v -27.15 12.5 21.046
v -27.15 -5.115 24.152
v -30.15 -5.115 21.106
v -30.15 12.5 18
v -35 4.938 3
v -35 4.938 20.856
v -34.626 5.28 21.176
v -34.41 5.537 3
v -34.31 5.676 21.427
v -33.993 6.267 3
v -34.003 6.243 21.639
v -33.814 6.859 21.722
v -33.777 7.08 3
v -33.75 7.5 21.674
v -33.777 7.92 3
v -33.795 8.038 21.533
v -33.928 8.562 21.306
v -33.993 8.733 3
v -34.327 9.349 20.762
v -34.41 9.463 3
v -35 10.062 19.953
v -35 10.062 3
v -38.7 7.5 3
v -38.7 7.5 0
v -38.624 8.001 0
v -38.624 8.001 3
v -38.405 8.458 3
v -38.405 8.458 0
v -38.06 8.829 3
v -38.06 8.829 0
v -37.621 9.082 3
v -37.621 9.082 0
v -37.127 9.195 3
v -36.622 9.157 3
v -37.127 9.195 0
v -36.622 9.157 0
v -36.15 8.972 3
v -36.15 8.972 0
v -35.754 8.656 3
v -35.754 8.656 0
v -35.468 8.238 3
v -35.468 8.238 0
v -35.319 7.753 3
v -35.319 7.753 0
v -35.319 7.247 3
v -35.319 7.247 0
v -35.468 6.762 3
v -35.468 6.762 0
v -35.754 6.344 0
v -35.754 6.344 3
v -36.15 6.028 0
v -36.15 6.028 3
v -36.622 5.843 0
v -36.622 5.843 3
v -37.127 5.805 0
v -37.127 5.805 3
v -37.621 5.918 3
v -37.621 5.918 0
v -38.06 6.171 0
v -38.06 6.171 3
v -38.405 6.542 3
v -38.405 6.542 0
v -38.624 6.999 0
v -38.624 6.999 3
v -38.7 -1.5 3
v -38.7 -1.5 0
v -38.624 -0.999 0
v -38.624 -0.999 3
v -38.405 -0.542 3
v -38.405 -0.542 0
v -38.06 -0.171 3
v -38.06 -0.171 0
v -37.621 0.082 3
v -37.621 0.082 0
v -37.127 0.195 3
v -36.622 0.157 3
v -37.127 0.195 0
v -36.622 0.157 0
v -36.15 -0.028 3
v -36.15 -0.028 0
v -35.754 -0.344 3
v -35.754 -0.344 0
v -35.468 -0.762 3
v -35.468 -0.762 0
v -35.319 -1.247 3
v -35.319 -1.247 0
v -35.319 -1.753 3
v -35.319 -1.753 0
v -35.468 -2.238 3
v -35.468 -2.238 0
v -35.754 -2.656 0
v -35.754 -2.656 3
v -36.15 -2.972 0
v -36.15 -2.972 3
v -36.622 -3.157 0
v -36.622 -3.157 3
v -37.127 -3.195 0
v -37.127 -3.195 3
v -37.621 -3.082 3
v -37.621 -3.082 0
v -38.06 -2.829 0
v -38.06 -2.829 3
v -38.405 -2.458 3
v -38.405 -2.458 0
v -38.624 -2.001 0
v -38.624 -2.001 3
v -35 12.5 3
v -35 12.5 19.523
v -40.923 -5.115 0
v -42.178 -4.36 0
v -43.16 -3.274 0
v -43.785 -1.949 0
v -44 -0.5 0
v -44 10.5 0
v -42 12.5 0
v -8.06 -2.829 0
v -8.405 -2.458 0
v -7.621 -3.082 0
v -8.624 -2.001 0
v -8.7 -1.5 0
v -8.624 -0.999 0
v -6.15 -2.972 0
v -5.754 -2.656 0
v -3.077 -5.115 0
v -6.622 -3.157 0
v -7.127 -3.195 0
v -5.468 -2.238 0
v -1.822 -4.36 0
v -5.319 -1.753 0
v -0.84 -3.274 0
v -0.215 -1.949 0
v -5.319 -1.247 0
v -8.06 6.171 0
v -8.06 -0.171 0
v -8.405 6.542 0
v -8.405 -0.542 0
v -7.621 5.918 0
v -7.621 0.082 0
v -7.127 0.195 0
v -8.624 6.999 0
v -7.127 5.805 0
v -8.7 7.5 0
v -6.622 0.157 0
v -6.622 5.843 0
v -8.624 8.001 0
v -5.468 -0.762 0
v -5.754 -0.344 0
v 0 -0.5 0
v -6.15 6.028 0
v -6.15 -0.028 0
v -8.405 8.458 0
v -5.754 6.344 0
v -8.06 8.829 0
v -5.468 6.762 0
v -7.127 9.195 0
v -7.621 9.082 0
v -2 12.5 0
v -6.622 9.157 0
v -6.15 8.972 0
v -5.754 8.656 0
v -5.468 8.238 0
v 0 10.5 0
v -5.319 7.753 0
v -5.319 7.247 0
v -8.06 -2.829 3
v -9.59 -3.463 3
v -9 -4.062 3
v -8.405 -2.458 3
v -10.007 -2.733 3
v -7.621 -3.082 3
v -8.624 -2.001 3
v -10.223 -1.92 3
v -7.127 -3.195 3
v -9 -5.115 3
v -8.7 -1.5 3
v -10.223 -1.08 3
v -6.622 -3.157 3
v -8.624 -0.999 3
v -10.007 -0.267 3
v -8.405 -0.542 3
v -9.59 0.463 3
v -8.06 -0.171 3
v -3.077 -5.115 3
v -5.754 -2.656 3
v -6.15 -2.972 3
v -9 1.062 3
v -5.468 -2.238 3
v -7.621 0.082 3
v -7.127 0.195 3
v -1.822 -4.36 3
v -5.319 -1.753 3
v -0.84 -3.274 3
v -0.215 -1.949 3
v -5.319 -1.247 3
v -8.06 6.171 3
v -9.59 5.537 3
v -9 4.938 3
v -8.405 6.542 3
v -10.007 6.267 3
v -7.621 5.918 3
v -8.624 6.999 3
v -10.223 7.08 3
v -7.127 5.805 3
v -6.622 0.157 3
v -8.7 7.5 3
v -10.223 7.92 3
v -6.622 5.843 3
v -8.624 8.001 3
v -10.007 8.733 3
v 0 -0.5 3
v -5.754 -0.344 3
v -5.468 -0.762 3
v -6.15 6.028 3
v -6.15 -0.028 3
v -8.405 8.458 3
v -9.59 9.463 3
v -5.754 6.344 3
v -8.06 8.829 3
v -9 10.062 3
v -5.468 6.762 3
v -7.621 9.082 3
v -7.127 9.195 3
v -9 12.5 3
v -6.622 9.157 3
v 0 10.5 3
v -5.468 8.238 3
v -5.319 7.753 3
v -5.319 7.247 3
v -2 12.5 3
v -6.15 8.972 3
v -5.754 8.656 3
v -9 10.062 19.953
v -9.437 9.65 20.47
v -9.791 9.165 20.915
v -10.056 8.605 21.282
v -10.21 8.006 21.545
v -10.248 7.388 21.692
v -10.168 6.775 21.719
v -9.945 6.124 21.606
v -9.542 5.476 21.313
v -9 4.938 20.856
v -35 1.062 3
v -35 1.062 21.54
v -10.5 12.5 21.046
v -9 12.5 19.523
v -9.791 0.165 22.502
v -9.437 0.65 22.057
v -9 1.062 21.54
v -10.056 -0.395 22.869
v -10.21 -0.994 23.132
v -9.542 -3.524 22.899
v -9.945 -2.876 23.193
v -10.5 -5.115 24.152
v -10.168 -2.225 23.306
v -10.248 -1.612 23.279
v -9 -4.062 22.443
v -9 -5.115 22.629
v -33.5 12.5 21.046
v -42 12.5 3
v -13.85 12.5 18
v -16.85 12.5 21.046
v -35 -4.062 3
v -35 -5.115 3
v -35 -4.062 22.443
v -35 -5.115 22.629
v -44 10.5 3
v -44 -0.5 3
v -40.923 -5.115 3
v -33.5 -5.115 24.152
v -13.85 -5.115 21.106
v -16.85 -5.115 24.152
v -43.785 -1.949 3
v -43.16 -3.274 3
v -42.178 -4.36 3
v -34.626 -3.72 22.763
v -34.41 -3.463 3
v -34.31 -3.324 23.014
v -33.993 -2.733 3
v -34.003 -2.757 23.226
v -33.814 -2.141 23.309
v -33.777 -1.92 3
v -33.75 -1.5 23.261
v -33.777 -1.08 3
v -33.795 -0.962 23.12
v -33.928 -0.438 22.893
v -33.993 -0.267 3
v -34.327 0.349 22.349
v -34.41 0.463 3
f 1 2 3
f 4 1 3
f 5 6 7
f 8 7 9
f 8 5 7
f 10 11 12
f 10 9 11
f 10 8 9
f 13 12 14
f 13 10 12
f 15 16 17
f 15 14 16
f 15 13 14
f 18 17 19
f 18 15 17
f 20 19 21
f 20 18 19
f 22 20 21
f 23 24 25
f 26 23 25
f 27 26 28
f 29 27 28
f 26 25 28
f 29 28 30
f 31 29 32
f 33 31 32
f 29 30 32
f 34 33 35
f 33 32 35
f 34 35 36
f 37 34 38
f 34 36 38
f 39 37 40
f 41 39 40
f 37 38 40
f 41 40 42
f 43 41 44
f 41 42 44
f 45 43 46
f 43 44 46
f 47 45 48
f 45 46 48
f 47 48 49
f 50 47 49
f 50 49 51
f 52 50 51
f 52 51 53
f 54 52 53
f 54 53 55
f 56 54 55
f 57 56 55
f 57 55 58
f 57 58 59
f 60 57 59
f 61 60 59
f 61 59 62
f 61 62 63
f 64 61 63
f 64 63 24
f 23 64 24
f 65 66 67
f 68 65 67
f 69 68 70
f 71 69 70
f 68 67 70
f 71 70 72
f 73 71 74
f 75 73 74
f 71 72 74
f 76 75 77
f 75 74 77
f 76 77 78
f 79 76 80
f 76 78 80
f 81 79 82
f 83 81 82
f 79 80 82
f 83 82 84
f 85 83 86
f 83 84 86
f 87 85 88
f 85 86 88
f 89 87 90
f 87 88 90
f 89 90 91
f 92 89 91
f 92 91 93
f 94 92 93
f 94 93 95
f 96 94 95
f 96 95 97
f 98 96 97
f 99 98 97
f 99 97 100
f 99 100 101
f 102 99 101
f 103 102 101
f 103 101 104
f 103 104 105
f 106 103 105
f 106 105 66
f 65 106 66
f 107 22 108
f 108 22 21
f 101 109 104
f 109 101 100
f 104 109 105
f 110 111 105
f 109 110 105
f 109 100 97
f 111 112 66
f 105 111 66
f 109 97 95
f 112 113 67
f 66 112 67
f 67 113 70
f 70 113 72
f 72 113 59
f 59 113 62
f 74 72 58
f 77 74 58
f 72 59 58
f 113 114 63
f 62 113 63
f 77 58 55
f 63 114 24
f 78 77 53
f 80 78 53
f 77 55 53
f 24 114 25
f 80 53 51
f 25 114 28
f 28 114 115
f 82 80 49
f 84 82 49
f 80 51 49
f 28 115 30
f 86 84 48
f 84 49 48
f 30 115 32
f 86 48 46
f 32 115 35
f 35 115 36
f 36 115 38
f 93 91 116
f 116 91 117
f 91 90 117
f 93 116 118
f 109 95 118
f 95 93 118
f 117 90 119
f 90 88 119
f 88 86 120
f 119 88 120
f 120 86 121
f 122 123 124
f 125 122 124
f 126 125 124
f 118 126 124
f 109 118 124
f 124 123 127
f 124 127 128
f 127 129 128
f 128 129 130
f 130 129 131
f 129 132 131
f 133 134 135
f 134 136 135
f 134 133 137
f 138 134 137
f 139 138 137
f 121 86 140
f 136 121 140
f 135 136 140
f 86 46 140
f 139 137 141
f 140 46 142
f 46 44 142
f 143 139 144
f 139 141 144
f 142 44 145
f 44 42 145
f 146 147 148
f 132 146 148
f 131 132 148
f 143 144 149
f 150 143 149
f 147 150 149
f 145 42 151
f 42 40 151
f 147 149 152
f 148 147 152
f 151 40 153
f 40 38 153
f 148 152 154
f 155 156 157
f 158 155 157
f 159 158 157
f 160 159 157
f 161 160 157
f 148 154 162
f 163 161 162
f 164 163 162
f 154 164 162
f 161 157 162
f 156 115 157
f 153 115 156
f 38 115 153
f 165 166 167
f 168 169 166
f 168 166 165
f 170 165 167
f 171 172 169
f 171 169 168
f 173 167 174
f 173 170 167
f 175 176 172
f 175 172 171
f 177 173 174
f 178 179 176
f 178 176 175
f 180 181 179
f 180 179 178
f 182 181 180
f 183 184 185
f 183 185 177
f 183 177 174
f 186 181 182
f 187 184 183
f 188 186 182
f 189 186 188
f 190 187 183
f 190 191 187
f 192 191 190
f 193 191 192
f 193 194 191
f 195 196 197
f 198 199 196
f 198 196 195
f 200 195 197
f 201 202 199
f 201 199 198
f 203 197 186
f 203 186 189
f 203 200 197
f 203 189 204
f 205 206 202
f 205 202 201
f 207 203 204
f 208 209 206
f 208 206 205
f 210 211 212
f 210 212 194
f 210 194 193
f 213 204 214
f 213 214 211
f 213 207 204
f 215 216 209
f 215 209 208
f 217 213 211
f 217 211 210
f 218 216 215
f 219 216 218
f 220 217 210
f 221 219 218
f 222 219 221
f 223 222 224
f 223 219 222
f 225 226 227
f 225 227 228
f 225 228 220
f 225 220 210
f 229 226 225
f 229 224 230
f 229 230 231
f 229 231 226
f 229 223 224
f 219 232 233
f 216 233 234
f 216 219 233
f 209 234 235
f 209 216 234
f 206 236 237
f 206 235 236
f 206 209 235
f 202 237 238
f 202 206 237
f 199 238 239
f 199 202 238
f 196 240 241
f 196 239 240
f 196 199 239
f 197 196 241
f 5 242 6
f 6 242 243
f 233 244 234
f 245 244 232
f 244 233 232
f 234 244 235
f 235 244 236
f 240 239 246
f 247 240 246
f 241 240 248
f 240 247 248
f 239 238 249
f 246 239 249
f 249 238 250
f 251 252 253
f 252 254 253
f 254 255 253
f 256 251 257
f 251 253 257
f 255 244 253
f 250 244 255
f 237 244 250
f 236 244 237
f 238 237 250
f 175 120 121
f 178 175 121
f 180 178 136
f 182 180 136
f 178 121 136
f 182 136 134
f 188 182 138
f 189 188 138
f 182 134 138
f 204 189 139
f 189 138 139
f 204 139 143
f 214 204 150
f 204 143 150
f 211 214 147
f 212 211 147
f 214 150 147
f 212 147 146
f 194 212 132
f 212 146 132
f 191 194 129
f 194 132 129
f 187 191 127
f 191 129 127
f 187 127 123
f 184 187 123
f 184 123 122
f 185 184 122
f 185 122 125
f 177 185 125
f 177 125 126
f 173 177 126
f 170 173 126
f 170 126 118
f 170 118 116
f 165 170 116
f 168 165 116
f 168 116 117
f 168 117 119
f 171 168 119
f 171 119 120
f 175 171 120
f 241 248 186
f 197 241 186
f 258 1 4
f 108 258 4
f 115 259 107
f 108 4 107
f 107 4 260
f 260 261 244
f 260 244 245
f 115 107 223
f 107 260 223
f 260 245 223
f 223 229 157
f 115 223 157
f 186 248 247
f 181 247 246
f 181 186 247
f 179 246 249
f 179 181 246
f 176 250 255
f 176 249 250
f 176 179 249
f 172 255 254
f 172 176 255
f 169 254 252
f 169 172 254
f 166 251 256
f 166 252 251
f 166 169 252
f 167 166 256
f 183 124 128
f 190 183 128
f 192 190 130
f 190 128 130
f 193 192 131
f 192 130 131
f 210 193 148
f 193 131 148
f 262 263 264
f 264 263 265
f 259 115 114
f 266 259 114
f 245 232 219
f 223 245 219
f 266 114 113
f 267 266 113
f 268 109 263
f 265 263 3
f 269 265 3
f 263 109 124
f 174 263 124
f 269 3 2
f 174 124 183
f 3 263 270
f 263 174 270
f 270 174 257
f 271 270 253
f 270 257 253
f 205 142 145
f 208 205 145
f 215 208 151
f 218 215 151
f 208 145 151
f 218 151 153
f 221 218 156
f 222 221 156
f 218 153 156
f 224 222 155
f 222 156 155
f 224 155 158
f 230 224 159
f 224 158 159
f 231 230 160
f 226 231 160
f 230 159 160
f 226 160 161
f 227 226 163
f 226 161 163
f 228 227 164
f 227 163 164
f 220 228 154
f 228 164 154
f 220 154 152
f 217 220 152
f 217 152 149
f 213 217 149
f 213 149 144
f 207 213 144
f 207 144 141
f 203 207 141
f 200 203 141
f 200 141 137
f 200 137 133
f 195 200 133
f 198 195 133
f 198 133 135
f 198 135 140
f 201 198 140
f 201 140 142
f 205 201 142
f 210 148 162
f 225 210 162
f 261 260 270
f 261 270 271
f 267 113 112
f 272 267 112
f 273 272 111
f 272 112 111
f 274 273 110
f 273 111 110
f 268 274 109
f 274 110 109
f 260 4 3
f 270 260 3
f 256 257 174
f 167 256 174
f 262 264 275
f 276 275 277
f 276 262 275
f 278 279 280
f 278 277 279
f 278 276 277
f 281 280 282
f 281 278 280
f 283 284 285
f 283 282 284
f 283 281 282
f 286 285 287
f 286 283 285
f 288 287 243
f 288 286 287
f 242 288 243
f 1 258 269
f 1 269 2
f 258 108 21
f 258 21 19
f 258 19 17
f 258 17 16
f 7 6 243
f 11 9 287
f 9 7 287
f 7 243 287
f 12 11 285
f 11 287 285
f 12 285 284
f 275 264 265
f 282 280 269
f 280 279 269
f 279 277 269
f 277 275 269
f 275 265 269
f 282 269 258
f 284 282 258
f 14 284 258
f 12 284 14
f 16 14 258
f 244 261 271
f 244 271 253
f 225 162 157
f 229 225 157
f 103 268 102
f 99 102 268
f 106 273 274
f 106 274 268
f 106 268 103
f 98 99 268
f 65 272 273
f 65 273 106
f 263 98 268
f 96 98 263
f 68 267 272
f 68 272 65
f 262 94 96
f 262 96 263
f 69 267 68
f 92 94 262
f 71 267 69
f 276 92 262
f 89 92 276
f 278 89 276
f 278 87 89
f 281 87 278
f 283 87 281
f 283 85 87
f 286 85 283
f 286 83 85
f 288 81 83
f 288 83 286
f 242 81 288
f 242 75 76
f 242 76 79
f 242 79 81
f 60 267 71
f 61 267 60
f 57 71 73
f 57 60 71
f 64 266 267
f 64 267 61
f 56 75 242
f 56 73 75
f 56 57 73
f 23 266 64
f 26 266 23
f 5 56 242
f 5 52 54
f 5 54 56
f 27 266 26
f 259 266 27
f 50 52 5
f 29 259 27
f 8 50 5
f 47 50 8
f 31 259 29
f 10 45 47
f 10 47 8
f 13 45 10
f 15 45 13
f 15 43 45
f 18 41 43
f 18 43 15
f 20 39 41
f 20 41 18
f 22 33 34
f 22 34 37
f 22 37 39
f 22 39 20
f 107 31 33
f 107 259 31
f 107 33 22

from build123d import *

# Parameters (mm, degrees)
BOSS_EXTRUDE1_DEPTH             = 3
M3_CLEARANCE_HOLE1_D            = 3.4
BOSS_EXTRUDE3_DEPTH             = 13
BOSS_EXTRUDE3_DEPTH_BACK        = 13
BOSS_EXTRUDE4_REACH             = 52.335
BOSS_EXTRUDE4_DIRECTION_2_REACH = 52.335
CUT_EXTRUDE1_REACH              = 52.395
SKETCH7_R                       = 3.25


with BuildPart() as part:
    # Sketch1 → Boss-Extrude1 (new body)
    with BuildSketch(Plane.XY):
        with BuildLine():
            Line((-40.923076923, -5.115384615), (-3.076923077, -5.115384615))
            ThreePointArc((-3.076923077, -5.115384615), (-0.839748528, -3.273500981), (0, -0.5))
            Line((0, -0.5), (0, 10.5))
            Line((0, 10.5), (-2, 12.5))
            Line((-2, 12.5), (-42, 12.5))
            Line((-42, 12.5), (-44, 10.5))
            Line((-44, 10.5), (-44, -0.5))
            ThreePointArc((-44, -0.5), (-43.160251472, -3.273500981), (-40.923076923, -5.115384615))
        make_face()
    extrude(amount=BOSS_EXTRUDE1_DEPTH)

    # M3 Clearance Hole1 (through all)
    with Locations(Plane.XY.offset(3)):
        with Locations((-37, 7.5), (-37, -1.5), (-7, 7.5), (-7, -1.5)):
            Hole(M3_CLEARANCE_HOLE1_D / 2)

    # Sketch5 → Boss-Extrude3 (add, two sides: drawn at the far end of the back side and taken through both)
    with BuildSketch(Plane(origin=(-22, 0, 0), x_dir=(0, 0, -1), z_dir=(1, 0, 0)).offset(-BOSS_EXTRUDE3_DEPTH_BACK)):
        Polygon((-18, 12.5), (-21.106067583, -5.115384615), (-3, -5.115384615), (-3, 12.5), align=None)
    extrude(amount=BOSS_EXTRUDE3_DEPTH + BOSS_EXTRUDE3_DEPTH_BACK)

    # Boss-Extrude4: up to this plane
    boss_extrude4_end = Plane(origin=(-40.923076923, -5.115384615, 3), z_dir=(0, 1, 0))
    # Sketch6 → Boss-Extrude4 (add, up to the surface)
    with BuildSketch(Plane(origin=(0, 0.237205282, -0.041825691), x_dir=(1, 0, 0), z_dir=(0, 0.9848077530122074, -0.17364817766693444)), mode=Mode.PRIVATE) as boss_extrude4_sk1:
        Polygon((-35, -19.897141775), (-35, -21.397141775), (-33.5, -22.897141775), (-27.15, -22.897141775), (-30.15, -19.897141775), align=None)
    boss_extrude4_tool1 = split(extrude(boss_extrude4_sk1.sketch, amount=-BOSS_EXTRUDE4_REACH, mode=Mode.PRIVATE), bisect_by=boss_extrude4_end, keep=Keep.BOTH, mode=Mode.PRIVATE)
    add(boss_extrude4_tool1.solids().sort_by_distance((-31.594351, 3.963678, 21.092053))[0])
    # Sketch6 → Boss-Extrude4 (add, up to the surface)
    with BuildSketch(Plane(origin=(0, 0.237205282, -0.041825691), x_dir=(1, 0, 0), z_dir=(0, 0.9848077530122074, -0.17364817766693444)), mode=Mode.PRIVATE) as boss_extrude4_sk2:
        Polygon((-13.85, -19.897141775), (-16.85, -22.897141775), (-10.5, -22.897141775), (-9, -21.397141775), (-9, -19.897141775), align=None)
    boss_extrude4_tool2 = split(extrude(boss_extrude4_sk2.sketch, amount=-BOSS_EXTRUDE4_REACH, mode=Mode.PRIVATE), bisect_by=boss_extrude4_end, keep=Keep.BOTH, mode=Mode.PRIVATE)
    add(boss_extrude4_tool2.solids().sort_by_distance((-12.405649, 3.963678, 21.092053))[0])

    # Boss-Extrude4 direction 2: up to this plane
    boss_extrude4_direction_2_end = Plane(origin=(-2, 12.5, 3), z_dir=(0, -1, 0))
    # Sketch6 → Boss-Extrude4 direction 2 (add, up to the surface)
    with BuildSketch(Plane(origin=(0, 0.237205282, -0.041825691), x_dir=(1, 0, 0), z_dir=(0, 0.9848077530122074, -0.17364817766693444)), mode=Mode.PRIVATE) as boss_extrude4_direction_2_sk1:
        Polygon((-35, -19.897141775), (-35, -21.397141775), (-33.5, -22.897141775), (-27.15, -22.897141775), (-30.15, -19.897141775), align=None)
    boss_extrude4_direction_2_tool1 = split(extrude(boss_extrude4_direction_2_sk1.sketch, amount=BOSS_EXTRUDE4_DIRECTION_2_REACH, mode=Mode.PRIVATE), bisect_by=boss_extrude4_direction_2_end, keep=Keep.BOTH, mode=Mode.PRIVATE)
    add(boss_extrude4_direction_2_tool1.solids().sort_by_distance((-31.594351, 3.963678, 21.092053))[0])
    # Sketch6 → Boss-Extrude4 direction 2 (add, up to the surface)
    with BuildSketch(Plane(origin=(0, 0.237205282, -0.041825691), x_dir=(1, 0, 0), z_dir=(0, 0.9848077530122074, -0.17364817766693444)), mode=Mode.PRIVATE) as boss_extrude4_direction_2_sk2:
        Polygon((-13.85, -19.897141775), (-16.85, -22.897141775), (-10.5, -22.897141775), (-9, -21.397141775), (-9, -19.897141775), align=None)
    boss_extrude4_direction_2_tool2 = split(extrude(boss_extrude4_direction_2_sk2.sketch, amount=BOSS_EXTRUDE4_DIRECTION_2_REACH, mode=Mode.PRIVATE), bisect_by=boss_extrude4_direction_2_end, keep=Keep.BOTH, mode=Mode.PRIVATE)
    add(boss_extrude4_direction_2_tool2.solids().sort_by_distance((-12.405649, 3.963678, 21.092053))[0])

    # Sketch7 → Cut-Extrude1 (cut, up to next)
    with BuildSketch(Plane.XY.offset(3), mode=Mode.PRIVATE) as cut_extrude1_sk1:
        with Locations((-37, 7.5)):
            Circle(SKETCH7_R)
    cut_extrude1_tool1 = extrude(cut_extrude1_sk1.sketch, amount=CUT_EXTRUDE1_REACH, mode=Mode.PRIVATE) & part.part
    # Sketch7 → Cut-Extrude1 (cut, up to next)
    with BuildSketch(Plane.XY.offset(3), mode=Mode.PRIVATE) as cut_extrude1_sk2:
        with Locations((-37, -1.5)):
            Circle(SKETCH7_R)
    cut_extrude1_tool2 = extrude(cut_extrude1_sk2.sketch, amount=CUT_EXTRUDE1_REACH, mode=Mode.PRIVATE) & part.part
    # Sketch7 → Cut-Extrude1 (cut, up to next)
    with BuildSketch(Plane.XY.offset(3), mode=Mode.PRIVATE) as cut_extrude1_sk3:
        with Locations((-7, -1.5)):
            Circle(SKETCH7_R)
    cut_extrude1_tool3 = extrude(cut_extrude1_sk3.sketch, amount=CUT_EXTRUDE1_REACH, mode=Mode.PRIVATE) & part.part
    # Sketch7 → Cut-Extrude1 (cut, up to next)
    with BuildSketch(Plane.XY.offset(3), mode=Mode.PRIVATE) as cut_extrude1_sk4:
        with Locations((-7, 7.5)):
            Circle(SKETCH7_R)
    cut_extrude1_tool4 = extrude(cut_extrude1_sk4.sketch, amount=CUT_EXTRUDE1_REACH, mode=Mode.PRIVATE) & part.part
    add(cut_extrude1_tool1.solids().sort_by_distance((-37, 7.5, 3))[0], mode=Mode.SUBTRACT)
    add(cut_extrude1_tool2.solids().sort_by_distance((-37, -1.5, 3))[0], mode=Mode.SUBTRACT)
    add(cut_extrude1_tool3.solids().sort_by_distance((-7, -1.5, 3))[0], mode=Mode.SUBTRACT)
    add(cut_extrude1_tool4.solids().sort_by_distance((-7, 7.5, 3))[0], mode=Mode.SUBTRACT)


solid = part.part
